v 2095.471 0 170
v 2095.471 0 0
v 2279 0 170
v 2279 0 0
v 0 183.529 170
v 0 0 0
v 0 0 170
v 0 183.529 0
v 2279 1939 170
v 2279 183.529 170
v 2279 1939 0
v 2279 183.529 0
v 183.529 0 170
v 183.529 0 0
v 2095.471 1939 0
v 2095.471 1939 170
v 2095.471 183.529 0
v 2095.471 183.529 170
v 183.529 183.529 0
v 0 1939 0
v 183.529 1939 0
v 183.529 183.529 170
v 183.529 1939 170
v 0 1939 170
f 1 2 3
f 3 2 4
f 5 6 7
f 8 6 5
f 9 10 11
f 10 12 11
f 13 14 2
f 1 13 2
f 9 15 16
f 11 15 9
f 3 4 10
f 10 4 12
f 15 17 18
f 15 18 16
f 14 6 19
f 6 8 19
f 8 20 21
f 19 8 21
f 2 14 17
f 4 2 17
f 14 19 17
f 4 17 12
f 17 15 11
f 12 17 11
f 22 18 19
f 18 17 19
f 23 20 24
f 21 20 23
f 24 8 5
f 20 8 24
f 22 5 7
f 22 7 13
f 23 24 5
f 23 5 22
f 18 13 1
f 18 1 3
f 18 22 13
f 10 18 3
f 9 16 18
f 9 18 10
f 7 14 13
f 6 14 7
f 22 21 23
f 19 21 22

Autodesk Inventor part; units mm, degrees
ref_plane "YZ Plane" through (0, 0, 0) normal (1, 0, 0) x (0, 1, 0)
ref_plane "XY Plane" through (0, 0, 0) normal (0, 0, 1) x (1, 0, 0)
sketch "スケッチ2" plane through (0, 0, 0) normal (0, 0, 1) x (1, 0, 0)
  line L0 (2279, 0) -> (2279, 1939)
  line L1 (0, 1939.0001) -> (183.5291, 1939.0001)
  line L2 (183.5291, 1939.0001) -> (183.5291, 183.5291)
  line L3 (183.5291, 0) -> (0, 0)
  line L4 (0, 0) -> (0, 1939.0001)
  line L5 (0, 0) -> (2279, 0)
  line L6 (2279, 0) -> (2279, 183.5291)
  line L7 (2095.4709, 183.5291) -> (183.5291, 183.5291)
  line L8 (0, 183.5291) -> (0, 0)
  line L9 (2279, 0) -> (2095.4709, 0)
  line L10 (2095.4709, 183.5291) -> (2095.4709, 1939)
  line L11 (2095.4709, 1939) -> (2279, 1939)
  line L12 (2279, 1939) -> (2279, 0)
  line L13 (2279, 1939) -> (2095.4709, 1939)
  line L14 (183.5291, 1939.0001) -> (0, 1939.0001)
  dimension "d10" = 2279
  dimension "d11" = 1939
  dimension "d12" = 1755.4709
  dimension "d13" = 1755.471
extrude "押し出し1" add sketch "スケッチ2" along normal blind 170
properties part number "rail"
